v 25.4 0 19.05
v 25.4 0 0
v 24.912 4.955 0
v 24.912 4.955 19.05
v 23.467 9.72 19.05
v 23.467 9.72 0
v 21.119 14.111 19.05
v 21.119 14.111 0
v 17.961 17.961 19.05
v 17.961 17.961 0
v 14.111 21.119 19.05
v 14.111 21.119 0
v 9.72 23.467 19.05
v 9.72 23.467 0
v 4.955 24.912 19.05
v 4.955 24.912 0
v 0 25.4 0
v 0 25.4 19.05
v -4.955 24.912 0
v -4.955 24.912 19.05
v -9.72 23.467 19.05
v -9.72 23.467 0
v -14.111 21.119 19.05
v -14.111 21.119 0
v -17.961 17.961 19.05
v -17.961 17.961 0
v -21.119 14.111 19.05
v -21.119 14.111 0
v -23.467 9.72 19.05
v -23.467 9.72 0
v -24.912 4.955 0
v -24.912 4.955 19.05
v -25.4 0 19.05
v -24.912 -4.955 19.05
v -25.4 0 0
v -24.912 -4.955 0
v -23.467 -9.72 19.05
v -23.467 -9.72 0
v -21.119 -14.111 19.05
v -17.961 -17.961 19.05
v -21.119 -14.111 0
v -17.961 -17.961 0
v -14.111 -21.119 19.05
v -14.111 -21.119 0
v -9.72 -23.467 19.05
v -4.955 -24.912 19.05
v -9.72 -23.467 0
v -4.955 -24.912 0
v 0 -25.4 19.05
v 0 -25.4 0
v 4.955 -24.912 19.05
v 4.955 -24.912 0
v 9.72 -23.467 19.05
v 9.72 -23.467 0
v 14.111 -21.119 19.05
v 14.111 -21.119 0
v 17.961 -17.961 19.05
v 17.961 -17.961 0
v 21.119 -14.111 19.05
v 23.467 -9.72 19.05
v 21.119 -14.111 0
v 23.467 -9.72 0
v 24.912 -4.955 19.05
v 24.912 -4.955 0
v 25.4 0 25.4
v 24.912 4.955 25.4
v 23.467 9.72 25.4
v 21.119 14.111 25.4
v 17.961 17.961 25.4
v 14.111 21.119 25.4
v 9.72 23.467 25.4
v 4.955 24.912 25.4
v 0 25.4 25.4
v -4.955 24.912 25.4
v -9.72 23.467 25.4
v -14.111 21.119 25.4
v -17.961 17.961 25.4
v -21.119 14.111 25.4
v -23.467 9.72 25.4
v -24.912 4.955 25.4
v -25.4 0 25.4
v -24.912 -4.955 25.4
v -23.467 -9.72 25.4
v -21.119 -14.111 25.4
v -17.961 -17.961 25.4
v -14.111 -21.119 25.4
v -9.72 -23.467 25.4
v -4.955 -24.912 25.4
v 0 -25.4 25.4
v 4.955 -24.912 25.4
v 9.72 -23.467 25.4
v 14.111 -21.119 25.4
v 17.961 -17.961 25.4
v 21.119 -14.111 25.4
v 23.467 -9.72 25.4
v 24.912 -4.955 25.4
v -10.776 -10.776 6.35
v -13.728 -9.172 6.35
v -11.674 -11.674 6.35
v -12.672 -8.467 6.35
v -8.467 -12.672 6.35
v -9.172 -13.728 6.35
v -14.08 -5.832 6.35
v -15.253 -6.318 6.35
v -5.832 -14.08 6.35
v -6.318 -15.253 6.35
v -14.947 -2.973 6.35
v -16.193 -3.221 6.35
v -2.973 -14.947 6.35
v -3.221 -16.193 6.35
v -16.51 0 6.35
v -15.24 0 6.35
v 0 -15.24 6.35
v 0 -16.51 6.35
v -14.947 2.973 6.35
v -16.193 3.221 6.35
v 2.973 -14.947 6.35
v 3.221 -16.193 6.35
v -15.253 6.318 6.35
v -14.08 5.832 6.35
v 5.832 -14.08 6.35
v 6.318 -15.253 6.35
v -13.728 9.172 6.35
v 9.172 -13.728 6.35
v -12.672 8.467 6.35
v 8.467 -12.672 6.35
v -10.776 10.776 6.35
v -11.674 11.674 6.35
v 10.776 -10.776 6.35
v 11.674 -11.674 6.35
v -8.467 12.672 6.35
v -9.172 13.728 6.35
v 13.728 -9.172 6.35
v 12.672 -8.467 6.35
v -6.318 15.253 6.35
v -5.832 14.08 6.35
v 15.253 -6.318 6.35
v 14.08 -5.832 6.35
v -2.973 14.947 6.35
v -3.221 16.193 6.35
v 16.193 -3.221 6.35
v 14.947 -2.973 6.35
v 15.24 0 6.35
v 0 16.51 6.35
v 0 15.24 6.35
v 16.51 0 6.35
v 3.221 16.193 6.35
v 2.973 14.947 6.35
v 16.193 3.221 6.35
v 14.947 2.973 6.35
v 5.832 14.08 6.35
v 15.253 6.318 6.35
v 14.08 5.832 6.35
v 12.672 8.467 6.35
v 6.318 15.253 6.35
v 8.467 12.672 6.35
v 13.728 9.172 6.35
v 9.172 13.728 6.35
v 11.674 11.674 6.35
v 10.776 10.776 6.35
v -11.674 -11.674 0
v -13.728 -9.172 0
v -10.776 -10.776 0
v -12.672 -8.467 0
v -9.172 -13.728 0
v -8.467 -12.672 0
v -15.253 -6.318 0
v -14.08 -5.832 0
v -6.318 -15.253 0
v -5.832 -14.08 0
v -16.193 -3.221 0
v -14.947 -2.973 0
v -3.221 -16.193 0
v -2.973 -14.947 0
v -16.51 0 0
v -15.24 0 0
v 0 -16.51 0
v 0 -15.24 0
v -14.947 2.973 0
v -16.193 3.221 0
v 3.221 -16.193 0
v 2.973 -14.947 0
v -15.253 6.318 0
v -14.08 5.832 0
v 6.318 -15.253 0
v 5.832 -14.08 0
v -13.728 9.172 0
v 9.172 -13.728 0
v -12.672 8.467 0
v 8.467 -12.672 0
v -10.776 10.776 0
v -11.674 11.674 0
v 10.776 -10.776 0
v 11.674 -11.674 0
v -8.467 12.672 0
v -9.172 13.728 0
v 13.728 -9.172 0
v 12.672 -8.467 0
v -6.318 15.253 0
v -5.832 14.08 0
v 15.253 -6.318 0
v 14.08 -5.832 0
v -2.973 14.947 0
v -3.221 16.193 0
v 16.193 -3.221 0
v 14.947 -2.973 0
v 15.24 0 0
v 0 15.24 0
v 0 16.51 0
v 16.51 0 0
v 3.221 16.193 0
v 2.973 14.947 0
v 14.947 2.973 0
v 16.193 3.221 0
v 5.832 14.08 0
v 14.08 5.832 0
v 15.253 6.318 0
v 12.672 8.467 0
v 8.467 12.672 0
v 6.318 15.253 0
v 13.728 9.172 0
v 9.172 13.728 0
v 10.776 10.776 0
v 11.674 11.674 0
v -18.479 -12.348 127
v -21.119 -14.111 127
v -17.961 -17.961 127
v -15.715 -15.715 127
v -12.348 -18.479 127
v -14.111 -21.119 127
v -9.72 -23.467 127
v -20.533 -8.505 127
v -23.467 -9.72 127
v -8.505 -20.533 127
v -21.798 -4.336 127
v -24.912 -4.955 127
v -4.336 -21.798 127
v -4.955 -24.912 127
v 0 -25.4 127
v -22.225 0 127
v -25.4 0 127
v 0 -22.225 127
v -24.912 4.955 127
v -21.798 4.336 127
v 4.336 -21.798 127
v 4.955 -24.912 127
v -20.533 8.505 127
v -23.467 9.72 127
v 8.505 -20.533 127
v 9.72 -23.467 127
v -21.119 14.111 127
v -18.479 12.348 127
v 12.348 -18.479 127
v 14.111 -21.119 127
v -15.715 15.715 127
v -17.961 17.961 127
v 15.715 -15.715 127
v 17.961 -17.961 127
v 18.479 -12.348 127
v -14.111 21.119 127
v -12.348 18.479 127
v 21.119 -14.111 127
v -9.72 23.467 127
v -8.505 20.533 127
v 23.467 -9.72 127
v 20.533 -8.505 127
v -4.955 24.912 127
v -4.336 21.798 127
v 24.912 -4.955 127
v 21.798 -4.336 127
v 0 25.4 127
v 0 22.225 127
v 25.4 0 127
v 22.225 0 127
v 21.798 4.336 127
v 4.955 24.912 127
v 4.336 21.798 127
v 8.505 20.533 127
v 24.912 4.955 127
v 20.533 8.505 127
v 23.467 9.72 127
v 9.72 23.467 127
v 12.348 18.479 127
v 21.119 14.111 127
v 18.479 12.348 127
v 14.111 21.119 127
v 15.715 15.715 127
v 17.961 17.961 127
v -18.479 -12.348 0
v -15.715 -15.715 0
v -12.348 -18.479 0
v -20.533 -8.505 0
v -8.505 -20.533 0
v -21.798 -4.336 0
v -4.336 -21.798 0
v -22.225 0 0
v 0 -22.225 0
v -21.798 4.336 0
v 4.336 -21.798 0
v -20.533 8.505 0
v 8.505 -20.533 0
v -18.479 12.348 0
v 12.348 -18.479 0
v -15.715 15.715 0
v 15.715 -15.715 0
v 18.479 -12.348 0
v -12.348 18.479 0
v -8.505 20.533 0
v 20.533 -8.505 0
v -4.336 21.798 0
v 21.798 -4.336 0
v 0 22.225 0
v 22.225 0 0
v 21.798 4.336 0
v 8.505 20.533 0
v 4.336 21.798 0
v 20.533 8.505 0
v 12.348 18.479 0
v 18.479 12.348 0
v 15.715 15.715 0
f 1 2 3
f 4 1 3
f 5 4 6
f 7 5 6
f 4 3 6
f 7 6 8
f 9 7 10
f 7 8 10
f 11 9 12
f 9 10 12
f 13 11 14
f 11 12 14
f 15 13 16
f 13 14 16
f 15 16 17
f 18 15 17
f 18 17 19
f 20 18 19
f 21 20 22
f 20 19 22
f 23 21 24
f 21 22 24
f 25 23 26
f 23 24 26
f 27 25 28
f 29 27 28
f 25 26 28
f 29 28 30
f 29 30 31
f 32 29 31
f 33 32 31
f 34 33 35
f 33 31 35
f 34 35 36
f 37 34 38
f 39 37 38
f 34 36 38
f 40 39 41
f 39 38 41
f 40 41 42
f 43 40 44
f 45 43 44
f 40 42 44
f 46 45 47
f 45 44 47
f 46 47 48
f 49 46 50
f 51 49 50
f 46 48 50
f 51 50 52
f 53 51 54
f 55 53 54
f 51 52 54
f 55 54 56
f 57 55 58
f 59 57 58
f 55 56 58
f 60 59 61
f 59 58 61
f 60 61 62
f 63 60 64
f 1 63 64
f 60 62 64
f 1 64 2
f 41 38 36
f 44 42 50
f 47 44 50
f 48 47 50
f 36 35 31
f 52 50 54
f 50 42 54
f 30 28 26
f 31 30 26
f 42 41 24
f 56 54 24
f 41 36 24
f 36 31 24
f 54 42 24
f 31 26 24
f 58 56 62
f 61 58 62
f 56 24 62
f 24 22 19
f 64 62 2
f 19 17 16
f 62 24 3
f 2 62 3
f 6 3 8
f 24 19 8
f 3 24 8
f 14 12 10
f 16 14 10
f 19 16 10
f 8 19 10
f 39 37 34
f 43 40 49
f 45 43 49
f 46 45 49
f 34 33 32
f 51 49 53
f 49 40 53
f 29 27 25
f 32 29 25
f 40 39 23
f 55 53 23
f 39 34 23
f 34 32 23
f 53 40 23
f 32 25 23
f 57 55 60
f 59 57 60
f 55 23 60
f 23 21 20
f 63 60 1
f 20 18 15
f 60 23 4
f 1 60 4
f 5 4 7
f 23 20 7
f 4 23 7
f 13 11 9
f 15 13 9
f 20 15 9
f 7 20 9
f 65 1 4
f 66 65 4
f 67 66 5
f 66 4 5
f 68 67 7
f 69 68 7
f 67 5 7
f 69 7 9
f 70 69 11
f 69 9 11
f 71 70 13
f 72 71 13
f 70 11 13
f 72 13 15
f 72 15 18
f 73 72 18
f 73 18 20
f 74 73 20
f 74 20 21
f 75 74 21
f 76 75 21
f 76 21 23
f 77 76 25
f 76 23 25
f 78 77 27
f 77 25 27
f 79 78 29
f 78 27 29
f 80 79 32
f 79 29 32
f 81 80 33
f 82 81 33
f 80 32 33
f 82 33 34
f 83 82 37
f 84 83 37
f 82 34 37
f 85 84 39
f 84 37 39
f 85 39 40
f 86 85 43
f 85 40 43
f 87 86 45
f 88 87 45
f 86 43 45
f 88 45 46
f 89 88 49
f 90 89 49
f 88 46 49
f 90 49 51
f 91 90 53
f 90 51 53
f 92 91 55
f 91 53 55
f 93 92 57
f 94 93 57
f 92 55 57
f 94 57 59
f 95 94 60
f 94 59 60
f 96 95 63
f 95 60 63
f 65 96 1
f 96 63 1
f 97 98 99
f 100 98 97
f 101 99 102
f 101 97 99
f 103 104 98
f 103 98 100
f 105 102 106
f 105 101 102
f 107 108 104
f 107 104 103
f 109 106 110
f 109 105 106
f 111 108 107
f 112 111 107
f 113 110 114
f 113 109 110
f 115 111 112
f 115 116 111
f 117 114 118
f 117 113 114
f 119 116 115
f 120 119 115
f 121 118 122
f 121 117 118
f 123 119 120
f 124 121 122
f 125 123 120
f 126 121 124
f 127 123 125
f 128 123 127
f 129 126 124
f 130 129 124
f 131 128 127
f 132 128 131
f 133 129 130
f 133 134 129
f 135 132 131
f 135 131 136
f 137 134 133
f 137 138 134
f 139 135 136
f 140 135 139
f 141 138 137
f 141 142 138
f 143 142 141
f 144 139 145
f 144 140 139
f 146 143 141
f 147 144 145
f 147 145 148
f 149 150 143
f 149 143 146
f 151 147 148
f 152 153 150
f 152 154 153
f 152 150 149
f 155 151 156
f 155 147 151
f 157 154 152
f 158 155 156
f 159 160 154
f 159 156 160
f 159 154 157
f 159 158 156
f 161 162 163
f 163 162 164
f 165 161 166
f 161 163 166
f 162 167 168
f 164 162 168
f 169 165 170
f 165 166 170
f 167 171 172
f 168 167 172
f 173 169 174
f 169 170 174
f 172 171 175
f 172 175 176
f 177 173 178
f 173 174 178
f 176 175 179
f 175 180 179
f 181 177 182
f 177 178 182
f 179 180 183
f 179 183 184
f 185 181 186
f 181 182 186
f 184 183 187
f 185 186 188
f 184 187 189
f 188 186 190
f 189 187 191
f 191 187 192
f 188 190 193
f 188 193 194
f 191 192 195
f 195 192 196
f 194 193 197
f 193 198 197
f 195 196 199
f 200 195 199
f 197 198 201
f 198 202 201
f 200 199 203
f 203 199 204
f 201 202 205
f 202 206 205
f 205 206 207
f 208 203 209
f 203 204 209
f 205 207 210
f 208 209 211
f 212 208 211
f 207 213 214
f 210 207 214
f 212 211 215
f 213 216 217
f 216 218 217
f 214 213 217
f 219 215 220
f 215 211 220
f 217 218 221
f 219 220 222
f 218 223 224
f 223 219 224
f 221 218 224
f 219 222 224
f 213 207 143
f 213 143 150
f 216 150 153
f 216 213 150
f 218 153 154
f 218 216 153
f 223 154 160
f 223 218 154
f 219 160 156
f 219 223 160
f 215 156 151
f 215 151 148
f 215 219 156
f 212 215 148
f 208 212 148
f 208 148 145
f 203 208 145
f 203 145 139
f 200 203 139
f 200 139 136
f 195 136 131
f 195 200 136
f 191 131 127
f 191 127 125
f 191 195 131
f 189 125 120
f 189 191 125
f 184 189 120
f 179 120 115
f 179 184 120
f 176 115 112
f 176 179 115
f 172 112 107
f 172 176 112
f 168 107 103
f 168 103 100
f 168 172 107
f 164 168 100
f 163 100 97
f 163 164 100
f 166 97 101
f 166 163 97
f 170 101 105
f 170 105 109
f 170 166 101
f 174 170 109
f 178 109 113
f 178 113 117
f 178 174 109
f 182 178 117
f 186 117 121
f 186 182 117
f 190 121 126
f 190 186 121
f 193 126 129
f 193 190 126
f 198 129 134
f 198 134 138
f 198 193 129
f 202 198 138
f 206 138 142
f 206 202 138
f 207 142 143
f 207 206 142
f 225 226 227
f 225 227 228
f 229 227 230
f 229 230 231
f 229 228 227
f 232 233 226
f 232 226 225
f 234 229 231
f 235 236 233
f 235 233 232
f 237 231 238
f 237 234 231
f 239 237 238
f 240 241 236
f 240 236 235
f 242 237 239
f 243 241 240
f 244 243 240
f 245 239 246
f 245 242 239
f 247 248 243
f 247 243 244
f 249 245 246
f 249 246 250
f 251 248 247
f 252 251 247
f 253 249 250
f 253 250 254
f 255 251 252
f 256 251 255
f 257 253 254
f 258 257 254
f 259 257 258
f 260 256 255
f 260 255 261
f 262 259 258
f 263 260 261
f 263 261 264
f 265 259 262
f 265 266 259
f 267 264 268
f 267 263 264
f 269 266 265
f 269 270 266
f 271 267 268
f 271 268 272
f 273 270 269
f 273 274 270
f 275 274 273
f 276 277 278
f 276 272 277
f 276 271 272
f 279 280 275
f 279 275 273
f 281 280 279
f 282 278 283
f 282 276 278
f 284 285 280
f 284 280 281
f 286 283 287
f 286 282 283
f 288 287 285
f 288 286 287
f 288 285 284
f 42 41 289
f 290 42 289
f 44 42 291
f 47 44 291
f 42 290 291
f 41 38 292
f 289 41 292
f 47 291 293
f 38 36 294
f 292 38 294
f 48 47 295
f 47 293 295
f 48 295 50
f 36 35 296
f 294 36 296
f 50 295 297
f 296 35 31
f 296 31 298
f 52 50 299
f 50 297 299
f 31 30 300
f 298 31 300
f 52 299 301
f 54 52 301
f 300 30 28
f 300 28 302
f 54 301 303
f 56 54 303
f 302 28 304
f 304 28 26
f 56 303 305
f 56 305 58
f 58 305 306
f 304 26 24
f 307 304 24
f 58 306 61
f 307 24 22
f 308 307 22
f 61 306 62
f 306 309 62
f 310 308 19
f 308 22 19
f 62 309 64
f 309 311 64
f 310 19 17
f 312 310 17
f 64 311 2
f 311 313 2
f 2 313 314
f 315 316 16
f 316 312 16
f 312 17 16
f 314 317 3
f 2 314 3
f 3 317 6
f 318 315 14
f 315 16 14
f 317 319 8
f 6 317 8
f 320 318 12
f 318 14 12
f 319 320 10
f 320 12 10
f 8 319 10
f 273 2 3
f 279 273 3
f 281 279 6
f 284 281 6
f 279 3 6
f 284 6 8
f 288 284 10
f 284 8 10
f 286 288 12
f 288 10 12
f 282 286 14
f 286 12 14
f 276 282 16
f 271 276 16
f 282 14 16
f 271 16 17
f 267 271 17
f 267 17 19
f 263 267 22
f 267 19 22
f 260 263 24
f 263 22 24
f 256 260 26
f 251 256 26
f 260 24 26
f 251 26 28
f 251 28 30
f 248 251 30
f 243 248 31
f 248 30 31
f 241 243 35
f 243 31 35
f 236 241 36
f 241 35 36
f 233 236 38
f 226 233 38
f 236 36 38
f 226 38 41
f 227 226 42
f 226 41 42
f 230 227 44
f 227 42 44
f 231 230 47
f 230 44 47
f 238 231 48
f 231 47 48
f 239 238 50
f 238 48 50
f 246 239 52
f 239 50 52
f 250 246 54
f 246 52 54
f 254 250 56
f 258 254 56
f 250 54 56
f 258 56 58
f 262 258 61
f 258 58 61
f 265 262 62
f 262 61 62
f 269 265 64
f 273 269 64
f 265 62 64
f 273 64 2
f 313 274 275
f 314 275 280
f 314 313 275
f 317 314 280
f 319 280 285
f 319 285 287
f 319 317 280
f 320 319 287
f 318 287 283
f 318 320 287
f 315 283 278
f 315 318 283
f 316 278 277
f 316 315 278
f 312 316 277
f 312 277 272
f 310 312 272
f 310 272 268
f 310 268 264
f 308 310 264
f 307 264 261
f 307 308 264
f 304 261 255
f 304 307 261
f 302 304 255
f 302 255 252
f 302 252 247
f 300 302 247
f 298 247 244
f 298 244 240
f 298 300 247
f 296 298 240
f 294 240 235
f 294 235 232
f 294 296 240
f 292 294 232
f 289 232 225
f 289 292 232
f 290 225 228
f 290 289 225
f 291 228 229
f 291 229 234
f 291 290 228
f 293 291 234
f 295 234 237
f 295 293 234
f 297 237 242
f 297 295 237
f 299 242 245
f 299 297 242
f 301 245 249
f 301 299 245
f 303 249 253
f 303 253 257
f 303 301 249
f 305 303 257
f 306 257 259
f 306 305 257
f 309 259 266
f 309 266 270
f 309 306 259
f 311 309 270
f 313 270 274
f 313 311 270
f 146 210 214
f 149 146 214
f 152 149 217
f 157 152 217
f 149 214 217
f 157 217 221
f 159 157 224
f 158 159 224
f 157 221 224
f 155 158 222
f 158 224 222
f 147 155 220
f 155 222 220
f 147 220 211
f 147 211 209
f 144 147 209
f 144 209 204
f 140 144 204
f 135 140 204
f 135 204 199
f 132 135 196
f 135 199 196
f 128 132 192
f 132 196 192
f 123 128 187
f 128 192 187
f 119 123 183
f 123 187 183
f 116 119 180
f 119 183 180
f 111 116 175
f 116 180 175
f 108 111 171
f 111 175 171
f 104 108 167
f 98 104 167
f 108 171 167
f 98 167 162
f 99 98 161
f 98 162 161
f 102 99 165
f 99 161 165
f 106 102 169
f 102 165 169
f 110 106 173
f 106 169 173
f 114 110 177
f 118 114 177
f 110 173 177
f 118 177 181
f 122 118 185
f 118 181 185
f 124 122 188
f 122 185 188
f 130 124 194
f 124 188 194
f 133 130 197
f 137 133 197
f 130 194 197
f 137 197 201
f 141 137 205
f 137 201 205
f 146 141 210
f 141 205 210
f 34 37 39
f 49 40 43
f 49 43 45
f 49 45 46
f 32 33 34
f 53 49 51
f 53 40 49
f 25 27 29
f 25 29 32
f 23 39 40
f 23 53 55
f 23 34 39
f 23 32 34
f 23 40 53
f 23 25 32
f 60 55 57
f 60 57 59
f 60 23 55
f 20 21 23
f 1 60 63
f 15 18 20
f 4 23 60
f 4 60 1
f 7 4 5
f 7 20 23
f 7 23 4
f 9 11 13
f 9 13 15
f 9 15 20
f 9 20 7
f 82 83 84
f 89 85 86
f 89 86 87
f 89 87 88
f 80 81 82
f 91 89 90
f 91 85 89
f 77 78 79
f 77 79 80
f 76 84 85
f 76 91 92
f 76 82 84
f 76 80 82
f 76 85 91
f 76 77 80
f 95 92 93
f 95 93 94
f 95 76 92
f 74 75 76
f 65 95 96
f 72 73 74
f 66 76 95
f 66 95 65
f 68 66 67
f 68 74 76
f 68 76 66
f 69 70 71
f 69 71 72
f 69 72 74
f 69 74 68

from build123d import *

# Parameters (mm, degrees)
F0_R      = 25.4
F1_DEPTH  = 19.05
F2_R      = 25.4
F2_R_2    = 22.225
F3_DEPTH  = 127
F4_R      = 16.51
F4_R_2    = 15.24
F1_FACE_R = 25.4
F5_DEPTH  = 6.35


with BuildPart() as f1:
    # F0 (on Top) → F1 (new body)
    with BuildSketch(Plane.XY):
        Circle(F0_R)
    extrude(amount=F1_DEPTH)


with BuildPart() as f3:
    # F2 (on Top) → F3 (new body)
    with BuildSketch(Plane.XY):
        Circle(F2_R)
        Circle(F2_R_2, mode=Mode.SUBTRACT)
    extrude(amount=F3_DEPTH)


with BuildPart() as f5:
    # F4 (on Top) + F1_face (on face) → F5 (new body)
    with BuildSketch(Plane.XY):
        Circle(F4_R)
        Circle(F4_R_2, mode=Mode.SUBTRACT)
    with BuildSketch(Plane.XY.offset(19.05)):
        Circle(F1_FACE_R)
    extrude(amount=F5_DEPTH)


solid = Compound([f1.part, f3.part, f5.part])
